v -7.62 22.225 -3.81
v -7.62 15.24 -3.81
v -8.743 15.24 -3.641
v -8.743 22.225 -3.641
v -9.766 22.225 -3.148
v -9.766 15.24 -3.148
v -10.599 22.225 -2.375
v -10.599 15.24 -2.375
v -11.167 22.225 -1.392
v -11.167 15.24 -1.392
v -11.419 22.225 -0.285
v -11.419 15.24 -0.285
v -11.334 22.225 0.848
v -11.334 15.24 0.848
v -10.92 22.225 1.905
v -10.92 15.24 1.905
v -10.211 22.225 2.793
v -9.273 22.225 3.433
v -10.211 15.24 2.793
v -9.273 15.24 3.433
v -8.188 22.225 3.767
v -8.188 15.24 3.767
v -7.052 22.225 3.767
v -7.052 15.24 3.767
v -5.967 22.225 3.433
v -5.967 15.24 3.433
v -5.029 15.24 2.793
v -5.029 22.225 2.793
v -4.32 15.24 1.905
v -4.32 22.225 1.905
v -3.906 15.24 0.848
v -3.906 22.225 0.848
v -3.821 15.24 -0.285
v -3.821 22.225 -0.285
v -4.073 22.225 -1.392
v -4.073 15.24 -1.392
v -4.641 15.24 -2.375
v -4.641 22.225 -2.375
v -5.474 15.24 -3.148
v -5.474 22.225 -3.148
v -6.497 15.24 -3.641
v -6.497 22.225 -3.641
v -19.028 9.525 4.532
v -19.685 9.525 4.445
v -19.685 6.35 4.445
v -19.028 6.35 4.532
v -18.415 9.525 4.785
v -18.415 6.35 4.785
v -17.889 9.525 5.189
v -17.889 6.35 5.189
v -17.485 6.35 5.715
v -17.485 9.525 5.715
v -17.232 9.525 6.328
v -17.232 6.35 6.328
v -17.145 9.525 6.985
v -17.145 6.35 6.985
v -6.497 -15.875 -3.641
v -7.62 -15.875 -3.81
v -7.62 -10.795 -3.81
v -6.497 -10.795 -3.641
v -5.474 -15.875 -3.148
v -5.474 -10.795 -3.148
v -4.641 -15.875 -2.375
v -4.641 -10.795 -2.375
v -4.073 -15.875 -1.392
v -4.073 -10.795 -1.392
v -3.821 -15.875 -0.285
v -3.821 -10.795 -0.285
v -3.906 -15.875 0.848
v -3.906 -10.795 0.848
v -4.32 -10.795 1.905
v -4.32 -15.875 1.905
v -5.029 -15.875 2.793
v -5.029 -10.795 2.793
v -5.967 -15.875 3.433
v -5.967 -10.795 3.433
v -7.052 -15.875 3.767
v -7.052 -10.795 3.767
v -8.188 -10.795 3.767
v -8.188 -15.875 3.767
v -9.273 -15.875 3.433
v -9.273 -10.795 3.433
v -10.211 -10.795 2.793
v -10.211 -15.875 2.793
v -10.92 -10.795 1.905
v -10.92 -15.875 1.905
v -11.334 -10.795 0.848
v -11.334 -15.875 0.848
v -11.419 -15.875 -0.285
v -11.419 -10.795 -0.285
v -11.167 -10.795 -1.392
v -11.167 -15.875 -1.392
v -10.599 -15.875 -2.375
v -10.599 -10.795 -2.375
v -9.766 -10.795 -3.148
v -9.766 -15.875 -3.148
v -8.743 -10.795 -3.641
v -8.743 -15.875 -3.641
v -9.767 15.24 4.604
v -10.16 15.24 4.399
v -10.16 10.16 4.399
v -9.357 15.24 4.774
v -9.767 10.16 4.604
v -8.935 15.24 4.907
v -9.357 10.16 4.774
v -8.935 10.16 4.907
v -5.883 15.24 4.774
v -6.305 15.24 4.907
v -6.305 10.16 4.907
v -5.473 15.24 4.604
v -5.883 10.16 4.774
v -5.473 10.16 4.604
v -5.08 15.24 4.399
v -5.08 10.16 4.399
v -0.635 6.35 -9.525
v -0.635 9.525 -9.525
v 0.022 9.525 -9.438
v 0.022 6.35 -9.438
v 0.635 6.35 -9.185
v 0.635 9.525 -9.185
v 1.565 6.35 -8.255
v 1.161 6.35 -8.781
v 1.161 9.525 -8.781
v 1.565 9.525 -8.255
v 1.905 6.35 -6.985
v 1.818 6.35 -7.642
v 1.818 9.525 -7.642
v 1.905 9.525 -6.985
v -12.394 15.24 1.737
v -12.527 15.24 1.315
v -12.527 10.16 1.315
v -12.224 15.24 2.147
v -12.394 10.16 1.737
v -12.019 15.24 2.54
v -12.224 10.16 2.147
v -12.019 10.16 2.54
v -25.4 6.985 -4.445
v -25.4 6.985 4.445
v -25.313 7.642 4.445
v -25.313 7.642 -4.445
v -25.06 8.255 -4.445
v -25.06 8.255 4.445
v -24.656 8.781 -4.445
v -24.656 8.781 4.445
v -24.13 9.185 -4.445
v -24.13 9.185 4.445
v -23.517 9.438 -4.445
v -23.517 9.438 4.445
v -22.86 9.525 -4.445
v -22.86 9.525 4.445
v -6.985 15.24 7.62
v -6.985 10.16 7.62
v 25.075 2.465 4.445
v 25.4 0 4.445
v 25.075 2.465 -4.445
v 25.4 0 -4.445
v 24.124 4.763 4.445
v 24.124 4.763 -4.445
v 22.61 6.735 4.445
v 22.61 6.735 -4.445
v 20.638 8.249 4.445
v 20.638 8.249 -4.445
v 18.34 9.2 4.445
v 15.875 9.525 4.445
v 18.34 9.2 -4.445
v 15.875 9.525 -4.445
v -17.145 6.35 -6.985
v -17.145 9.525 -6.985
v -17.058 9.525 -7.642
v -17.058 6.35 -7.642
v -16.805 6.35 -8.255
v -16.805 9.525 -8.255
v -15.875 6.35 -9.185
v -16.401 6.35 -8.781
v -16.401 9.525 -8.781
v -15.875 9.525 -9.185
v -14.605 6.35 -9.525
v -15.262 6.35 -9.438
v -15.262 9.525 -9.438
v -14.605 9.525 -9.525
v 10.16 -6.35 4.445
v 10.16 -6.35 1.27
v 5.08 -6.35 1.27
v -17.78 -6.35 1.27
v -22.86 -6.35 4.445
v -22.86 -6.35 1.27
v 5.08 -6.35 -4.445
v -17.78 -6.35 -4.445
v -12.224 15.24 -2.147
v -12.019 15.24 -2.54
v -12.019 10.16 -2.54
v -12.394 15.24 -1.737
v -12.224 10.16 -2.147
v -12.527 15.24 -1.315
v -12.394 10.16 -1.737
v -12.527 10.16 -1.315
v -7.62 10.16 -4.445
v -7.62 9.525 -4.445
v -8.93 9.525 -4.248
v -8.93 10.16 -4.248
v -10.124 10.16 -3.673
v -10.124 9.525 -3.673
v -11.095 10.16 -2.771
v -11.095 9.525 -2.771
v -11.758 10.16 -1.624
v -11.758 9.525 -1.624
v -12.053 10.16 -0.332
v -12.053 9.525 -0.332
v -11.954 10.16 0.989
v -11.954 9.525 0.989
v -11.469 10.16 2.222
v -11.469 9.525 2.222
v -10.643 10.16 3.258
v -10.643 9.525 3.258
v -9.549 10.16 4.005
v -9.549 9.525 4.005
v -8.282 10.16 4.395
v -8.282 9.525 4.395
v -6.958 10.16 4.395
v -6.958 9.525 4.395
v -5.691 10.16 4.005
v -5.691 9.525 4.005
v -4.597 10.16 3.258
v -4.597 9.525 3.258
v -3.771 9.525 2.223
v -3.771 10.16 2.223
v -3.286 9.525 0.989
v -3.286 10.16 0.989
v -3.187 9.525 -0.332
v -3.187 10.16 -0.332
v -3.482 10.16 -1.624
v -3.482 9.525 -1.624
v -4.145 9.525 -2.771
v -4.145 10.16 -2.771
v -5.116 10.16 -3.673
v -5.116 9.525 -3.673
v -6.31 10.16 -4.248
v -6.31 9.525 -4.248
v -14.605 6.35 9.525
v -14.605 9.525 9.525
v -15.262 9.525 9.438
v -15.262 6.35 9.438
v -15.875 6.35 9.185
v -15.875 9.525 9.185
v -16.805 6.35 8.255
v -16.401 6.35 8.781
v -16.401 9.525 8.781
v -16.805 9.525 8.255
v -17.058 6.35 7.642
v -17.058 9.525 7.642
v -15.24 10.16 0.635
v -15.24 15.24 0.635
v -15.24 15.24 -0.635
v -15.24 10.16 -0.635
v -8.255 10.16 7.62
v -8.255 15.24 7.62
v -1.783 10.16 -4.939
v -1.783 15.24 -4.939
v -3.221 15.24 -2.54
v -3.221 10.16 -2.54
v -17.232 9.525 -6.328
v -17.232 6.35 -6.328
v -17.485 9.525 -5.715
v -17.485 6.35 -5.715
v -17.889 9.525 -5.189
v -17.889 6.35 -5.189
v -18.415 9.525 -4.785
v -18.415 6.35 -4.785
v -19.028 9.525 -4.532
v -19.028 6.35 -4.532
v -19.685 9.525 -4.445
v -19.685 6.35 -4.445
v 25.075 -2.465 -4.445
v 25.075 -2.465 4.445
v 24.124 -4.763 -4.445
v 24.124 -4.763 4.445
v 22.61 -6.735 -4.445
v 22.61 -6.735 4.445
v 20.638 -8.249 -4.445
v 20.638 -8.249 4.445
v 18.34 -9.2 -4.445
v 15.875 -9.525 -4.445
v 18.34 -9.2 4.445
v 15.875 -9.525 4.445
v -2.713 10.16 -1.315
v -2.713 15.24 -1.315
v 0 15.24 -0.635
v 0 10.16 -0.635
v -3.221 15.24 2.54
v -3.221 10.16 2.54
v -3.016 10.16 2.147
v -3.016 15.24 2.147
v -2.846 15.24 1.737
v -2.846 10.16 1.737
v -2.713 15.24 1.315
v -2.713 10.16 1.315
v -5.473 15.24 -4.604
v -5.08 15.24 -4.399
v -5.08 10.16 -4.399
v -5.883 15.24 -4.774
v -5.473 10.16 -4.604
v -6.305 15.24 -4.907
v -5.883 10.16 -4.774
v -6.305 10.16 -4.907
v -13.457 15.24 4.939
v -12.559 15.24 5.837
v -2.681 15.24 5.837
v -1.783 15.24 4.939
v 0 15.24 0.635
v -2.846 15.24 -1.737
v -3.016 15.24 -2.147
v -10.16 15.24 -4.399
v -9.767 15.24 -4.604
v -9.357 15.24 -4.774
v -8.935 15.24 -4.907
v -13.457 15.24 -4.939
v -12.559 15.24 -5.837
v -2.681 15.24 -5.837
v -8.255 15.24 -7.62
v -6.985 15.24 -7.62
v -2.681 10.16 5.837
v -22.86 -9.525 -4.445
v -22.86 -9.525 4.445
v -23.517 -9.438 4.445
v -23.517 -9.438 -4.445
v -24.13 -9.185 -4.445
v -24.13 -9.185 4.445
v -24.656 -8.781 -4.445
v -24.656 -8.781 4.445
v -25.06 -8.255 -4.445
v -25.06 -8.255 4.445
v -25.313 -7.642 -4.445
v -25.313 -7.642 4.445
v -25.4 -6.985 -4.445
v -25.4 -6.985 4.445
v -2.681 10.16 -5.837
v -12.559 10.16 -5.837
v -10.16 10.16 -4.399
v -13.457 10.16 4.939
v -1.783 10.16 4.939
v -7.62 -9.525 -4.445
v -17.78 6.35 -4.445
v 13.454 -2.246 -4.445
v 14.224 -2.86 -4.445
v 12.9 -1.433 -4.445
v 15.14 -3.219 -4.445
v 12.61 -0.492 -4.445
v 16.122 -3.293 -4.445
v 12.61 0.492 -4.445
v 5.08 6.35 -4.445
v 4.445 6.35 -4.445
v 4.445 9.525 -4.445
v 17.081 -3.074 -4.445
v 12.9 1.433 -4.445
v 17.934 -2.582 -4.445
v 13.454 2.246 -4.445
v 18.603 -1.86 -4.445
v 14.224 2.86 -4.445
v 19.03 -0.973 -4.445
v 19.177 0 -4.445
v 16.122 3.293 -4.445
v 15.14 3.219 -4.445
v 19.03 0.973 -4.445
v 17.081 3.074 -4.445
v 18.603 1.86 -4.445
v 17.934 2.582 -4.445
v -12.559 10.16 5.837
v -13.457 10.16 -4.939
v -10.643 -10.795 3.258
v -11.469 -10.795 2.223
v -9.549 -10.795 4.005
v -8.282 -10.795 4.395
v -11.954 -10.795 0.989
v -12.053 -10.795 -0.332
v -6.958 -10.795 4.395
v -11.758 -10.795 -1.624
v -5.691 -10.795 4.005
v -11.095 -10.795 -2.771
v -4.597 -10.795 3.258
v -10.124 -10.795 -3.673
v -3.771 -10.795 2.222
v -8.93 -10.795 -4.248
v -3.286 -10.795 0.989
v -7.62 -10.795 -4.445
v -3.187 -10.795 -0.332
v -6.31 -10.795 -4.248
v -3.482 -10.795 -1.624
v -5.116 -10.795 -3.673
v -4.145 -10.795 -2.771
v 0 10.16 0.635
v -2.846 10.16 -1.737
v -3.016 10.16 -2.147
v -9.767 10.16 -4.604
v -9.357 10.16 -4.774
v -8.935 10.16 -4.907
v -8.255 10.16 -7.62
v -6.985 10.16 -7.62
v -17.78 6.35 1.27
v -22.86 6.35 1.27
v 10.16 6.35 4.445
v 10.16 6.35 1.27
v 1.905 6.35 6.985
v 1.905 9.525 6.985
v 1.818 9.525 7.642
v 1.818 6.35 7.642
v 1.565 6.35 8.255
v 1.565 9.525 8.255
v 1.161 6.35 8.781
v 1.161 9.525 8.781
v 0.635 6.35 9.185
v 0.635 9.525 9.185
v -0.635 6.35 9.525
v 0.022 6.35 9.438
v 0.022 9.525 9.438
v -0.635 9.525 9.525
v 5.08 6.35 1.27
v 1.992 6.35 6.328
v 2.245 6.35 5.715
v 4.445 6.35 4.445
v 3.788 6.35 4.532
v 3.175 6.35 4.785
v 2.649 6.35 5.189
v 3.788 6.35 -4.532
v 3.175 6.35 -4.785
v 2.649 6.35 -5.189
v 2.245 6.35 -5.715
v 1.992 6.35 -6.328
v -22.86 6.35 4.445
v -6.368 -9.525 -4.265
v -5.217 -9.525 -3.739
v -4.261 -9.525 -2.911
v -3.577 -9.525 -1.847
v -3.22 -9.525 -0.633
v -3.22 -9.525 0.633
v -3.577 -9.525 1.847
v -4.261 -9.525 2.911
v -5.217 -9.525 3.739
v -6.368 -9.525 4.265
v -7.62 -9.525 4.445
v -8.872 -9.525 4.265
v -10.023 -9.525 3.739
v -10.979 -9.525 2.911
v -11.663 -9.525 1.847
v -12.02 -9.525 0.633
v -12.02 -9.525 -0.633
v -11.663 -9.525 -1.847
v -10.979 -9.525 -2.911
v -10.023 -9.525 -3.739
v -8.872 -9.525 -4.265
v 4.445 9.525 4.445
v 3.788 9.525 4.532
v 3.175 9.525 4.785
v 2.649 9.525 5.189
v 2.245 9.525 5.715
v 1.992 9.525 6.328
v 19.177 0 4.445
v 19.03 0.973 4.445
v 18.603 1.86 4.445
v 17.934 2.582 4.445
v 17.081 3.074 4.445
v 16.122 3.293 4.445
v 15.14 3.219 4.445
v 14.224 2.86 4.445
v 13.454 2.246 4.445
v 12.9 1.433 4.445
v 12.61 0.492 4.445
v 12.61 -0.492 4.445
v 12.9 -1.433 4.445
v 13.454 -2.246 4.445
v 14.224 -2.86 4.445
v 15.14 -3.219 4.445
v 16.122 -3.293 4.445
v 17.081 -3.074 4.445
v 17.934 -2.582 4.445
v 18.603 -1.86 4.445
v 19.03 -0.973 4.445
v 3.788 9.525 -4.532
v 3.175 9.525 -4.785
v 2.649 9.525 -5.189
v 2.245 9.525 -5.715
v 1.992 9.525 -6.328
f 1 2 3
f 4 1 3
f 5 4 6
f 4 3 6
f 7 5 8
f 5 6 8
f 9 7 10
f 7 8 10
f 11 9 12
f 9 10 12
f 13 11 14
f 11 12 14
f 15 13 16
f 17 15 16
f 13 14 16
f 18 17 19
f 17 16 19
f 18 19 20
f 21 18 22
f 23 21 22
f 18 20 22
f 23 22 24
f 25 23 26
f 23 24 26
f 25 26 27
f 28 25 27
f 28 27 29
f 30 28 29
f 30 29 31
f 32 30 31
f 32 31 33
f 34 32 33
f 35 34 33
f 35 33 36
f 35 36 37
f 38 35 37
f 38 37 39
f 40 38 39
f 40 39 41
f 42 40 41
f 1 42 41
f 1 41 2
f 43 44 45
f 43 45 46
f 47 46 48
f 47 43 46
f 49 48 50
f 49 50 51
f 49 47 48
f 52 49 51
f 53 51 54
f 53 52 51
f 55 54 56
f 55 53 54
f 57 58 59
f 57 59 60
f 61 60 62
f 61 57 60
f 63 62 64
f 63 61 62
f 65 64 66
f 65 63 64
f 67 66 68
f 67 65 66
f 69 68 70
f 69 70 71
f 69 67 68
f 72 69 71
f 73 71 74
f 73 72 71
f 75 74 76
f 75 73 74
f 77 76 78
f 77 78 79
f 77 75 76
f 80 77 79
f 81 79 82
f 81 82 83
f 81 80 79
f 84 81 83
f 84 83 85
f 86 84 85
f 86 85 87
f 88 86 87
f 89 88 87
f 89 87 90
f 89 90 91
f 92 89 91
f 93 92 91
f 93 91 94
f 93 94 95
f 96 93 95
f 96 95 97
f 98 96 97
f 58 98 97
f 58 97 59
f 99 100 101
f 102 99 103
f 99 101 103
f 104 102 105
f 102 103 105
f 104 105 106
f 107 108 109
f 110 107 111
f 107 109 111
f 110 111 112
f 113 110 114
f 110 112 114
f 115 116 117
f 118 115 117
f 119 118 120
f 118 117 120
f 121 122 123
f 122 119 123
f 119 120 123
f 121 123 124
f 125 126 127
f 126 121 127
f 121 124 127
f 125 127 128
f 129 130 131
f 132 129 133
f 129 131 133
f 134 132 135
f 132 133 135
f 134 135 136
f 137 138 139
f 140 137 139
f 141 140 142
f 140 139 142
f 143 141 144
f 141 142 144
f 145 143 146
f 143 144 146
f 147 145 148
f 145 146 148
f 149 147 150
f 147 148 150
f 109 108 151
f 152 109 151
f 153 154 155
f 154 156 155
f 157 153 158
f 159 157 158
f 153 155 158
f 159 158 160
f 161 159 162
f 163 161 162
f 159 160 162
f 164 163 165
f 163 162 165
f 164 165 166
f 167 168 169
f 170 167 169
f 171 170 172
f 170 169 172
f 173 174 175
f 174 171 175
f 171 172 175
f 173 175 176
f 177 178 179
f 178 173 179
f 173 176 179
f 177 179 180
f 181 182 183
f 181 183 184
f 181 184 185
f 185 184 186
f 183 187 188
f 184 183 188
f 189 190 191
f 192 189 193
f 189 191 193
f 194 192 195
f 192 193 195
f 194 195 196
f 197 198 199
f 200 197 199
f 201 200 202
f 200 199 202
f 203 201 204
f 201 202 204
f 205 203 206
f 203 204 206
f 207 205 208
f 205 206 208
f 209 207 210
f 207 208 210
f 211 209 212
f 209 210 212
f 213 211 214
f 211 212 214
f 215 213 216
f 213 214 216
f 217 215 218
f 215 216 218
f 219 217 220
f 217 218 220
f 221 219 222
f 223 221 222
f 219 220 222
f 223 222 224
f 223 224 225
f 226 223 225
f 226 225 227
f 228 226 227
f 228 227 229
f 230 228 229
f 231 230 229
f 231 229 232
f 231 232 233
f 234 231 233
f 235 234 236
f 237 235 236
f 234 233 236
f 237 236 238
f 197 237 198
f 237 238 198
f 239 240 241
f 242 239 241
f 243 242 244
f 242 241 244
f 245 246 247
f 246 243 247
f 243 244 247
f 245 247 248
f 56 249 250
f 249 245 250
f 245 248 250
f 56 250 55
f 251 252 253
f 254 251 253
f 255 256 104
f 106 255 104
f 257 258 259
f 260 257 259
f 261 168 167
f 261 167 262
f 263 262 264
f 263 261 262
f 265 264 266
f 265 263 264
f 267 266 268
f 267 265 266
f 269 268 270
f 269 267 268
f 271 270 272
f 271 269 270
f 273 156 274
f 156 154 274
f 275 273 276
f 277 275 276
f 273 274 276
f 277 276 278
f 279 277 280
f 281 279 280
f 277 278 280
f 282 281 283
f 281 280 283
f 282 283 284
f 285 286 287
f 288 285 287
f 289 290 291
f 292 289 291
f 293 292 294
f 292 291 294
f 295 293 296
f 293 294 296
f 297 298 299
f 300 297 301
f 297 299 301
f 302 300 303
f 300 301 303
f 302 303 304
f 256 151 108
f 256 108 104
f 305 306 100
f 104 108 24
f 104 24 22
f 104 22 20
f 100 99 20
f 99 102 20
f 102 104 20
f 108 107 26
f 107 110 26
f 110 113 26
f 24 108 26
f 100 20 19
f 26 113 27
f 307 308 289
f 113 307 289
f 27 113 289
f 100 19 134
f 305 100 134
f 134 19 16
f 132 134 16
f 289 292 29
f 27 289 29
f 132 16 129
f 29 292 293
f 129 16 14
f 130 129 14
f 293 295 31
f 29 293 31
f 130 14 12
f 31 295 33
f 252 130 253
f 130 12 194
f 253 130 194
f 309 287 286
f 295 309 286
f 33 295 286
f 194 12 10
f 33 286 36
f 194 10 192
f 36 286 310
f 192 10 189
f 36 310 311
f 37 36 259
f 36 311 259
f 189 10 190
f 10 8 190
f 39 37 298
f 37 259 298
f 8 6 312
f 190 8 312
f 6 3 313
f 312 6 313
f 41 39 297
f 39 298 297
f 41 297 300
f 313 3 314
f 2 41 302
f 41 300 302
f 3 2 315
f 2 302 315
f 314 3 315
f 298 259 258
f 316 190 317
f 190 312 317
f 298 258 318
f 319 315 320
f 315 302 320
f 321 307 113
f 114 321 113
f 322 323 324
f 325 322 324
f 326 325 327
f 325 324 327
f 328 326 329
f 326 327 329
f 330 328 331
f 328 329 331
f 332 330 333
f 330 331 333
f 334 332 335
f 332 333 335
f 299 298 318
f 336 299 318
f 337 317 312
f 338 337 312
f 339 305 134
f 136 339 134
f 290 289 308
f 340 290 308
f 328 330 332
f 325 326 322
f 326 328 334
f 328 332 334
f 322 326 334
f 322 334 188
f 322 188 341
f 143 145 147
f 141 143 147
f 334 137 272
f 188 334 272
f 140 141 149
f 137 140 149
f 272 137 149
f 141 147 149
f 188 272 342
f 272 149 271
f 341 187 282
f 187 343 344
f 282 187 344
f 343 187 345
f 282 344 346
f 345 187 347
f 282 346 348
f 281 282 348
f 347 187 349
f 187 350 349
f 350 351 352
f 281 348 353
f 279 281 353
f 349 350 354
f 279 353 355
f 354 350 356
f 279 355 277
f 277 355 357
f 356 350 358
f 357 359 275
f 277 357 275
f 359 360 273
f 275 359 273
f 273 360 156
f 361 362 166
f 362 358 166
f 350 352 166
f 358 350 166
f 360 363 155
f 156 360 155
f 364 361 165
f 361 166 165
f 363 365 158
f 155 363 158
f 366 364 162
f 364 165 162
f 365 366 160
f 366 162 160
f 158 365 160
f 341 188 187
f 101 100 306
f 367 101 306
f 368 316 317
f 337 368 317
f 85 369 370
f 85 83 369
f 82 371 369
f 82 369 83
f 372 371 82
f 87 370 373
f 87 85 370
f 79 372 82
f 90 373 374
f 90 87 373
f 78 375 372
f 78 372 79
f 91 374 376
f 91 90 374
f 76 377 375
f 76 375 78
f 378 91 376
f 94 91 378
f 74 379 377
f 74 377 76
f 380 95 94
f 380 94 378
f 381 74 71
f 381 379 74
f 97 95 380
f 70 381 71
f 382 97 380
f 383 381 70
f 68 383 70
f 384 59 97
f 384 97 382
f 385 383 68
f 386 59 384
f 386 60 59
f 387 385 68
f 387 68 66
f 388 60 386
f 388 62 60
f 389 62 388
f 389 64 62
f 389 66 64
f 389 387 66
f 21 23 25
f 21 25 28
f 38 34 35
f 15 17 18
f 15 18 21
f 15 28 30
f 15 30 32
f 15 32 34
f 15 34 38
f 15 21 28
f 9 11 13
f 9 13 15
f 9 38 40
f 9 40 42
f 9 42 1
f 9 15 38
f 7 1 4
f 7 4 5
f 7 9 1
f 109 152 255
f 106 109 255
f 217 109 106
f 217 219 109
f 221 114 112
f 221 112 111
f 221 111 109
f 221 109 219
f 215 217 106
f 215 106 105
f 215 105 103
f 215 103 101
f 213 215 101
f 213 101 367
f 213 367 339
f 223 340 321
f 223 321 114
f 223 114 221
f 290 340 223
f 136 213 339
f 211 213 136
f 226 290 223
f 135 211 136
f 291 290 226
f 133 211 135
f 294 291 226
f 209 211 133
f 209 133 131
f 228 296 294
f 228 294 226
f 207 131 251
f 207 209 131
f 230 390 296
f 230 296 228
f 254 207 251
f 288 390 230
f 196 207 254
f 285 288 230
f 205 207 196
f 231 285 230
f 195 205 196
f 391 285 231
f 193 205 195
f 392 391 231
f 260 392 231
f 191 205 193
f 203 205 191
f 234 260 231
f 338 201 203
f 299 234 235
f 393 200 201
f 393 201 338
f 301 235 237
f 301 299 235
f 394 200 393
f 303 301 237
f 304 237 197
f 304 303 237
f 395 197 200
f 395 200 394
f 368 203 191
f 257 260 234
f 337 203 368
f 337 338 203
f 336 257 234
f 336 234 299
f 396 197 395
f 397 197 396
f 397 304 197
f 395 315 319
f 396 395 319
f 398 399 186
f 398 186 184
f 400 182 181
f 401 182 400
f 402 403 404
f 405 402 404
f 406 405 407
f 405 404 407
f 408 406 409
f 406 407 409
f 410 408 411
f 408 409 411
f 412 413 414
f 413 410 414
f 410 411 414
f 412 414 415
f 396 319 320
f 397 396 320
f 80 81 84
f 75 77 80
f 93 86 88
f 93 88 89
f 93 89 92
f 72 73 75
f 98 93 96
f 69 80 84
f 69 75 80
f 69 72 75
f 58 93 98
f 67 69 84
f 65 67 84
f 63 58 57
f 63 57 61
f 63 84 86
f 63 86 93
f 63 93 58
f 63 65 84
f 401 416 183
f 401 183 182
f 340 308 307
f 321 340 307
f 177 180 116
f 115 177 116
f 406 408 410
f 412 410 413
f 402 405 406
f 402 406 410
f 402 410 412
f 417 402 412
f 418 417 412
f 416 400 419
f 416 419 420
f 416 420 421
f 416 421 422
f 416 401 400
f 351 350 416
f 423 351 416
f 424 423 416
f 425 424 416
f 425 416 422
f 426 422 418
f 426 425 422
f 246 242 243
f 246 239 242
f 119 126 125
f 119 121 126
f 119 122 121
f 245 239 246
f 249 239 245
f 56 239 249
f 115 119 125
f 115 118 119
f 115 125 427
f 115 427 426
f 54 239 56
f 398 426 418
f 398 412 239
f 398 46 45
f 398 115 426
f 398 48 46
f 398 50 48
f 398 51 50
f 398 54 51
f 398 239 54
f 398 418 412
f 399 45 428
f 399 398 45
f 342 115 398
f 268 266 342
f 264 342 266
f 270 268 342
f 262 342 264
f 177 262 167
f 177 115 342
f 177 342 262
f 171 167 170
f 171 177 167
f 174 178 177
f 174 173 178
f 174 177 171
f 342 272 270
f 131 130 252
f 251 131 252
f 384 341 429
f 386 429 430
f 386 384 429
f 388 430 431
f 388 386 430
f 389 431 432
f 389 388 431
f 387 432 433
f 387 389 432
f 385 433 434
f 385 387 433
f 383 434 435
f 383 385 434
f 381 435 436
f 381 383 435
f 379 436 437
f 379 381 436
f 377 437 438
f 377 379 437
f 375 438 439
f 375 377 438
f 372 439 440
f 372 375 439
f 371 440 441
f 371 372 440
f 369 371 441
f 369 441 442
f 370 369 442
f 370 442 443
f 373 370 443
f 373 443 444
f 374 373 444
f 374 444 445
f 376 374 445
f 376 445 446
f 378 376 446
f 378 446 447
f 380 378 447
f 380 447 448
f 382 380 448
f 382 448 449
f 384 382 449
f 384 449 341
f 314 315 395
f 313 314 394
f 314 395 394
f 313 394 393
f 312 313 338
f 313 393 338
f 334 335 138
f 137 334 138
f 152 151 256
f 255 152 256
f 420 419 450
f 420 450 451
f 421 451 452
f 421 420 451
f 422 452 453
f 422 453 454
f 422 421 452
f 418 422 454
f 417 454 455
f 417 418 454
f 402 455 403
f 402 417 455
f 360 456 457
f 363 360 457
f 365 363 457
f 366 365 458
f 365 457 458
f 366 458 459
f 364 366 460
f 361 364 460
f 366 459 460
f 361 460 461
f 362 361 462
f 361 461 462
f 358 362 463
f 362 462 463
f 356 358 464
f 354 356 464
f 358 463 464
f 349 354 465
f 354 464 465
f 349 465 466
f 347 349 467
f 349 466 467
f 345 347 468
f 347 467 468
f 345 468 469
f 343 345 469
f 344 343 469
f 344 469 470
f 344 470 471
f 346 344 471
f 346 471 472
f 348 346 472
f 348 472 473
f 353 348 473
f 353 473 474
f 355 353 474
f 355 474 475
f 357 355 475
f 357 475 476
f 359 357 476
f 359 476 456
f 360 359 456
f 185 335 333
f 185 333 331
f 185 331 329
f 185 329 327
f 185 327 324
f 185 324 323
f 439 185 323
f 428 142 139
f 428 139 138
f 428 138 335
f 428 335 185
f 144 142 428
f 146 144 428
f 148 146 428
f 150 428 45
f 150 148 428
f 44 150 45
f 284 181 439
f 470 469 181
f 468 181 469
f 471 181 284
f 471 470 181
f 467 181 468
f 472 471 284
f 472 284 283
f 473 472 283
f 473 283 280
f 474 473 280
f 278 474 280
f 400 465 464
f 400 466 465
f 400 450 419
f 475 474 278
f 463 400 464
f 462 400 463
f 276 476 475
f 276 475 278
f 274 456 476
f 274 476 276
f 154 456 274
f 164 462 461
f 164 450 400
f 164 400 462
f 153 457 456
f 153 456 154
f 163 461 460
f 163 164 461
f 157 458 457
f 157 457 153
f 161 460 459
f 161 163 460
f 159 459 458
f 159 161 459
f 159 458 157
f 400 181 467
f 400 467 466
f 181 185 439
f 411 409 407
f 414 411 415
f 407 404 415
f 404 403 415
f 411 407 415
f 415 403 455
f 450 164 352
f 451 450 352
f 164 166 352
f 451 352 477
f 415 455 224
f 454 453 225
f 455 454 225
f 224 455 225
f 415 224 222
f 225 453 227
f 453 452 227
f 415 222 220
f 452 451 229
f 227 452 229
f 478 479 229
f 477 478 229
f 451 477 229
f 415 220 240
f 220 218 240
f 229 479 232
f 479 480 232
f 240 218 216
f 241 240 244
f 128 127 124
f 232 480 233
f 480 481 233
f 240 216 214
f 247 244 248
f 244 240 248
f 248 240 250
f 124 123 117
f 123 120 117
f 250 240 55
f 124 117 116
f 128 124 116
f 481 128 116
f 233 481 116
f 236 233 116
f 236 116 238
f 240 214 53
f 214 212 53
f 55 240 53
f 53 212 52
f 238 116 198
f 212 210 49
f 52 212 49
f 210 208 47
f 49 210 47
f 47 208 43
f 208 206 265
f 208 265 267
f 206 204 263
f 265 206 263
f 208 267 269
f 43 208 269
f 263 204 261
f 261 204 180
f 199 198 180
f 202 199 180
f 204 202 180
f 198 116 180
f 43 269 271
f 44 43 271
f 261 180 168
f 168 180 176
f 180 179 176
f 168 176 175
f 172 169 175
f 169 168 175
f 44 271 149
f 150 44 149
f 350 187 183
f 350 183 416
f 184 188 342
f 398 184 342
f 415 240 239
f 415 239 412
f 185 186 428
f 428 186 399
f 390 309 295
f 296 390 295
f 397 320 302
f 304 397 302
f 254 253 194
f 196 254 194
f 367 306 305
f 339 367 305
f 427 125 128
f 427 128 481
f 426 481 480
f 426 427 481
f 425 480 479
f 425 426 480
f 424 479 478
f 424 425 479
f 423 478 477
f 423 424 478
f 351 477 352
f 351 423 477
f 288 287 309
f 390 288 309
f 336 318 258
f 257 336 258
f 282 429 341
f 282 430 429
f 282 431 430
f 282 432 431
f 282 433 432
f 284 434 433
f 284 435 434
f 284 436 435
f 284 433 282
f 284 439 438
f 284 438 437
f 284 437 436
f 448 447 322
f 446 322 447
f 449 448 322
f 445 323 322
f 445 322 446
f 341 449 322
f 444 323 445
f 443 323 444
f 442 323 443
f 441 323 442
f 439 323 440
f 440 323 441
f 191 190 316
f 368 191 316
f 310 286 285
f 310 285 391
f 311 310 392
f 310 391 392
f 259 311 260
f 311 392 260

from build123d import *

# Parameters (mm, degrees)
SKETCH2_W               = 50.8
SKETCH2_H               = 19.05
BOSS_EXTRUDE1_DEPTH     = 4.445
CUT_EXTRUDE1_DEPTH      = 33.29387358
CUT_EXTRUDE1_DEPTH_BACK = 3.175
SKETCH4_W               = 33.02
SKETCH4_H               = 12.7
SKETCH6_W               = 22.86
SKETCH6_H               = 12.7
CUT_EXTRUDE2_DEPTH      = 29.546763827
FILLET2_R               = 9.525
SKETCH9_R               = 3.302
CUT_EXTRUDE4_DEPTH      = 29.546763827
SKETCH10_W              = 19.05
SKETCH10_H              = 19.05
BOSS_EXTRUDE2_DEPTH     = 3.175
FILLET1_R               = 2.54
SKETCH11_R              = 3.81
BOSS_EXTRUDE3_DEPTH     = 12.7
BOSS_EXTRUDE4_START     = 6.35
SKETCH12_R              = 3.81
BOSS_EXTRUDE4_DEPTH     = 6.35
SKETCH13_R              = 4.445
BOSS_EXTRUDE5_DEPTH     = 0.635
SKETCH14_R              = 5.08
BOSS_EXTRUDE6_DEPTH     = 5.08
BOSS_EXTRUDE7_DEPTH     = 5.08
CIRPATTERN1_COUNT       = 8
BOSS_EXTRUDE8_START     = 1.27
SKETCH16_R              = 4.445
BOSS_EXTRUDE8_DEPTH     = 1.27


# Some blends are built 0.0001 mm under size
with BuildPart() as part:
    # Sketch2 → Boss-Extrude1 (new, symmetric)
    with BuildSketch(Plane.XY):
        Rectangle(SKETCH2_W, SKETCH2_H)
    extrude(amount=BOSS_EXTRUDE1_DEPTH, both=True)

    # Sketch4 → Cut-Extrude1 (cut, two sides: drawn at the far end of the back side and taken through both)
    with BuildSketch(Plane(origin=(2.106978659, 4.870426214, 4.445), x_dir=(1, 0, 0), z_dir=(0, 0, 1)).offset(-CUT_EXTRUDE1_DEPTH_BACK)):
        with Locations((-8.456978659, -4.870426214)):
            Rectangle(SKETCH4_W, SKETCH4_H)
    extrude(amount=CUT_EXTRUDE1_DEPTH + CUT_EXTRUDE1_DEPTH_BACK, mode=Mode.SUBTRACT)

    # Sketch6 → Cut-Extrude2 (cut, through all)
    with BuildSketch(Plane(origin=(0, 0, -4.445), x_dir=(-1, 0, 0), z_dir=(0, 0, -1))):
        with Locations((6.35, 0)):
            Rectangle(SKETCH6_W, SKETCH6_H)
    extrude(amount=-CUT_EXTRUDE2_DEPTH, mode=Mode.SUBTRACT)

    # Fillet2
    fillet2_edges = [part.edges().sort_by_distance(p)[0] for p in [
        (25.4, -9.525, 0),
        (25.4, 9.525, 0),
    ]]
    fillet(fillet2_edges, radius=FILLET2_R - 0.0001)  # a hair under: the kernel refuses the full size

    # Sketch9 → Cut-Extrude4 (cut, through all)
    with BuildSketch(Plane.XY.offset(4.445)):
        with Locations((15.875, 0)):
            Circle(SKETCH9_R)
    extrude(amount=-CUT_EXTRUDE4_DEPTH, mode=Mode.SUBTRACT)

    # Sketch10 → Boss-Extrude2 (add)
    with BuildSketch(Plane(origin=(0, 9.525, 0), x_dir=(1, 0, 0), z_dir=(0, 1, 0))):
        with Locations((-7.62, 0)):
            Rectangle(SKETCH10_W, SKETCH10_H)
    extrude(amount=-BOSS_EXTRUDE2_DEPTH)

    # Fillet1
    # the kernel refuses this fillet: 2.54 mm, written as the material it adds along each edge
    with BuildSketch(Plane(origin=(-17.145, 9.525, -4.445), x_dir=(-1, 0, 0), z_dir=(0, -1, 0)), Plane(origin=(1.905, 6.35, -4.445), x_dir=(1, 0, 0), z_dir=(0, 1, 0))) as fillet1_piece_1:
        with BuildLine():
            CenterArc((FILLET1_R, FILLET1_R), FILLET1_R, 180, 90)
            Line((0, FILLET1_R), (0, 0))
            Line((0, 0), (FILLET1_R, 0))
        make_face()
    extrude(amount=3.175)
    with BuildSketch(Plane(origin=(1.905, 6.35, 4.445), x_dir=(1, 0, 0), z_dir=(0, 1, 0)), Plane(origin=(-17.145, 9.525, 4.445), x_dir=(-1, 0, 0), z_dir=(0, -1, 0))) as fillet1_piece_2:
        with BuildLine():
            CenterArc((FILLET1_R, -FILLET1_R), FILLET1_R, 90, 90)
            Line((0, -FILLET1_R), (0, 0))
            Line((0, 0), (FILLET1_R, 0))
        make_face()
    extrude(amount=3.175)
    # the kernel refuses this fillet: 2.54 mm, written as the material it takes off along each edge
    with BuildSketch(Plane(origin=(-25.4, -9.525, 10.795), x_dir=(1, 0, 0), z_dir=(0, 0, -1)), Plane(origin=(-25.4, 9.525, 10.795), x_dir=(0, -1, 0), z_dir=(0, 0, -1))) as fillet1_2_piece_1:
        with BuildLine():
            CenterArc((FILLET1_R, -FILLET1_R), FILLET1_R, 90, 90)
            Line((0, -FILLET1_R), (0, 0))
            Line((0, 0), (FILLET1_R, 0))
        make_face()
    extrude(amount=21.59, mode=Mode.SUBTRACT)
    with BuildSketch(Plane(origin=(-17.145, 15.875, -9.525), x_dir=(1, 0, 0), z_dir=(0, -1, 0)), Plane(origin=(1.905, 15.875, -9.525), x_dir=(0, 0, 1), z_dir=(0, -1, 0)), Plane(origin=(-17.145, 15.875, 9.525), x_dir=(0, 0, -1), z_dir=(0, -1, 0)), Plane(origin=(1.905, 15.875, 9.525), x_dir=(-1, 0, 0), z_dir=(0, -1, 0))) as fillet1_2_piece_2:
        with BuildLine():
            CenterArc((FILLET1_R, FILLET1_R), FILLET1_R, 180, 90)
            Line((0, FILLET1_R), (0, 0))
            Line((0, 0), (FILLET1_R, 0))
        make_face()
    extrude(amount=15.875, mode=Mode.SUBTRACT)

    # Sketch11 → Boss-Extrude3 (add)
    with BuildSketch(Plane(origin=(0, 9.525, 0), x_dir=(1, 0, 0), z_dir=(0, 1, 0))):
        with Locations(Location((-7.62, 0, 0), (0, 0, 90))):
            Circle(SKETCH11_R)
    extrude(amount=BOSS_EXTRUDE3_DEPTH)

    # Sketch12 → Boss-Extrude4 (add)
    with BuildSketch(Plane.XZ.offset(9.525).offset(BOSS_EXTRUDE4_START)):
        with Locations(Location((-7.62, 0, 0), (0, 0, 270))):
            Circle(SKETCH12_R)
    extrude(amount=-BOSS_EXTRUDE4_DEPTH)

    # Sketch13 → Boss-Extrude5 (add)
    with BuildSketch(Plane(origin=(0, 9.525, 0), x_dir=(1, 0, 0), z_dir=(0, 1, 0))):
        with Locations(Location((-7.62, 0, 0), (0, 0, 90))):
            Circle(SKETCH13_R)
    extrude(amount=BOSS_EXTRUDE5_DEPTH)

    # Sketch14 → Boss-Extrude6 (add)
    with BuildSketch(Plane(origin=(0, 10.16, 0), x_dir=(1, 0, 0), z_dir=(0, 1, 0))):
        with Locations(Location((-7.62, 0, 0), (0, 0, 270))):
            Circle(SKETCH14_R)
    extrude(amount=BOSS_EXTRUDE6_DEPTH)

    # Sketch15 → Boss-Extrude7 (add)
    with BuildSketch(Plane(origin=(0, 15.24, 0), x_dir=(1, 0, 0), z_dir=(0, 1, 0))):
        Polygon((-8.255, 7.62), (-6.985, 7.62), (-6.305199251, 4.906903198), (-8.934800749, 4.906903198), align=None)
    boss_extrude7 = extrude(amount=-BOSS_EXTRUDE7_DEPTH)

    # CirPattern1: Boss-Extrude7 ×8 about axis
    cirpattern1_axis = Axis((-7.62, 0, 0), (0, 1, 0))
    for i in range(1, CIRPATTERN1_COUNT):
        add(boss_extrude7.rotate(cirpattern1_axis, i * 360 / CIRPATTERN1_COUNT))

    # Sketch16 → Boss-Extrude8 (add)
    with BuildSketch(Plane.XZ.offset(9.525).offset(BOSS_EXTRUDE8_START)):
        with Locations(Location((-7.62, 0, 0), (0, 0, 270))):
            Circle(SKETCH16_R)
    extrude(amount=-BOSS_EXTRUDE8_DEPTH)


solid = part.part
